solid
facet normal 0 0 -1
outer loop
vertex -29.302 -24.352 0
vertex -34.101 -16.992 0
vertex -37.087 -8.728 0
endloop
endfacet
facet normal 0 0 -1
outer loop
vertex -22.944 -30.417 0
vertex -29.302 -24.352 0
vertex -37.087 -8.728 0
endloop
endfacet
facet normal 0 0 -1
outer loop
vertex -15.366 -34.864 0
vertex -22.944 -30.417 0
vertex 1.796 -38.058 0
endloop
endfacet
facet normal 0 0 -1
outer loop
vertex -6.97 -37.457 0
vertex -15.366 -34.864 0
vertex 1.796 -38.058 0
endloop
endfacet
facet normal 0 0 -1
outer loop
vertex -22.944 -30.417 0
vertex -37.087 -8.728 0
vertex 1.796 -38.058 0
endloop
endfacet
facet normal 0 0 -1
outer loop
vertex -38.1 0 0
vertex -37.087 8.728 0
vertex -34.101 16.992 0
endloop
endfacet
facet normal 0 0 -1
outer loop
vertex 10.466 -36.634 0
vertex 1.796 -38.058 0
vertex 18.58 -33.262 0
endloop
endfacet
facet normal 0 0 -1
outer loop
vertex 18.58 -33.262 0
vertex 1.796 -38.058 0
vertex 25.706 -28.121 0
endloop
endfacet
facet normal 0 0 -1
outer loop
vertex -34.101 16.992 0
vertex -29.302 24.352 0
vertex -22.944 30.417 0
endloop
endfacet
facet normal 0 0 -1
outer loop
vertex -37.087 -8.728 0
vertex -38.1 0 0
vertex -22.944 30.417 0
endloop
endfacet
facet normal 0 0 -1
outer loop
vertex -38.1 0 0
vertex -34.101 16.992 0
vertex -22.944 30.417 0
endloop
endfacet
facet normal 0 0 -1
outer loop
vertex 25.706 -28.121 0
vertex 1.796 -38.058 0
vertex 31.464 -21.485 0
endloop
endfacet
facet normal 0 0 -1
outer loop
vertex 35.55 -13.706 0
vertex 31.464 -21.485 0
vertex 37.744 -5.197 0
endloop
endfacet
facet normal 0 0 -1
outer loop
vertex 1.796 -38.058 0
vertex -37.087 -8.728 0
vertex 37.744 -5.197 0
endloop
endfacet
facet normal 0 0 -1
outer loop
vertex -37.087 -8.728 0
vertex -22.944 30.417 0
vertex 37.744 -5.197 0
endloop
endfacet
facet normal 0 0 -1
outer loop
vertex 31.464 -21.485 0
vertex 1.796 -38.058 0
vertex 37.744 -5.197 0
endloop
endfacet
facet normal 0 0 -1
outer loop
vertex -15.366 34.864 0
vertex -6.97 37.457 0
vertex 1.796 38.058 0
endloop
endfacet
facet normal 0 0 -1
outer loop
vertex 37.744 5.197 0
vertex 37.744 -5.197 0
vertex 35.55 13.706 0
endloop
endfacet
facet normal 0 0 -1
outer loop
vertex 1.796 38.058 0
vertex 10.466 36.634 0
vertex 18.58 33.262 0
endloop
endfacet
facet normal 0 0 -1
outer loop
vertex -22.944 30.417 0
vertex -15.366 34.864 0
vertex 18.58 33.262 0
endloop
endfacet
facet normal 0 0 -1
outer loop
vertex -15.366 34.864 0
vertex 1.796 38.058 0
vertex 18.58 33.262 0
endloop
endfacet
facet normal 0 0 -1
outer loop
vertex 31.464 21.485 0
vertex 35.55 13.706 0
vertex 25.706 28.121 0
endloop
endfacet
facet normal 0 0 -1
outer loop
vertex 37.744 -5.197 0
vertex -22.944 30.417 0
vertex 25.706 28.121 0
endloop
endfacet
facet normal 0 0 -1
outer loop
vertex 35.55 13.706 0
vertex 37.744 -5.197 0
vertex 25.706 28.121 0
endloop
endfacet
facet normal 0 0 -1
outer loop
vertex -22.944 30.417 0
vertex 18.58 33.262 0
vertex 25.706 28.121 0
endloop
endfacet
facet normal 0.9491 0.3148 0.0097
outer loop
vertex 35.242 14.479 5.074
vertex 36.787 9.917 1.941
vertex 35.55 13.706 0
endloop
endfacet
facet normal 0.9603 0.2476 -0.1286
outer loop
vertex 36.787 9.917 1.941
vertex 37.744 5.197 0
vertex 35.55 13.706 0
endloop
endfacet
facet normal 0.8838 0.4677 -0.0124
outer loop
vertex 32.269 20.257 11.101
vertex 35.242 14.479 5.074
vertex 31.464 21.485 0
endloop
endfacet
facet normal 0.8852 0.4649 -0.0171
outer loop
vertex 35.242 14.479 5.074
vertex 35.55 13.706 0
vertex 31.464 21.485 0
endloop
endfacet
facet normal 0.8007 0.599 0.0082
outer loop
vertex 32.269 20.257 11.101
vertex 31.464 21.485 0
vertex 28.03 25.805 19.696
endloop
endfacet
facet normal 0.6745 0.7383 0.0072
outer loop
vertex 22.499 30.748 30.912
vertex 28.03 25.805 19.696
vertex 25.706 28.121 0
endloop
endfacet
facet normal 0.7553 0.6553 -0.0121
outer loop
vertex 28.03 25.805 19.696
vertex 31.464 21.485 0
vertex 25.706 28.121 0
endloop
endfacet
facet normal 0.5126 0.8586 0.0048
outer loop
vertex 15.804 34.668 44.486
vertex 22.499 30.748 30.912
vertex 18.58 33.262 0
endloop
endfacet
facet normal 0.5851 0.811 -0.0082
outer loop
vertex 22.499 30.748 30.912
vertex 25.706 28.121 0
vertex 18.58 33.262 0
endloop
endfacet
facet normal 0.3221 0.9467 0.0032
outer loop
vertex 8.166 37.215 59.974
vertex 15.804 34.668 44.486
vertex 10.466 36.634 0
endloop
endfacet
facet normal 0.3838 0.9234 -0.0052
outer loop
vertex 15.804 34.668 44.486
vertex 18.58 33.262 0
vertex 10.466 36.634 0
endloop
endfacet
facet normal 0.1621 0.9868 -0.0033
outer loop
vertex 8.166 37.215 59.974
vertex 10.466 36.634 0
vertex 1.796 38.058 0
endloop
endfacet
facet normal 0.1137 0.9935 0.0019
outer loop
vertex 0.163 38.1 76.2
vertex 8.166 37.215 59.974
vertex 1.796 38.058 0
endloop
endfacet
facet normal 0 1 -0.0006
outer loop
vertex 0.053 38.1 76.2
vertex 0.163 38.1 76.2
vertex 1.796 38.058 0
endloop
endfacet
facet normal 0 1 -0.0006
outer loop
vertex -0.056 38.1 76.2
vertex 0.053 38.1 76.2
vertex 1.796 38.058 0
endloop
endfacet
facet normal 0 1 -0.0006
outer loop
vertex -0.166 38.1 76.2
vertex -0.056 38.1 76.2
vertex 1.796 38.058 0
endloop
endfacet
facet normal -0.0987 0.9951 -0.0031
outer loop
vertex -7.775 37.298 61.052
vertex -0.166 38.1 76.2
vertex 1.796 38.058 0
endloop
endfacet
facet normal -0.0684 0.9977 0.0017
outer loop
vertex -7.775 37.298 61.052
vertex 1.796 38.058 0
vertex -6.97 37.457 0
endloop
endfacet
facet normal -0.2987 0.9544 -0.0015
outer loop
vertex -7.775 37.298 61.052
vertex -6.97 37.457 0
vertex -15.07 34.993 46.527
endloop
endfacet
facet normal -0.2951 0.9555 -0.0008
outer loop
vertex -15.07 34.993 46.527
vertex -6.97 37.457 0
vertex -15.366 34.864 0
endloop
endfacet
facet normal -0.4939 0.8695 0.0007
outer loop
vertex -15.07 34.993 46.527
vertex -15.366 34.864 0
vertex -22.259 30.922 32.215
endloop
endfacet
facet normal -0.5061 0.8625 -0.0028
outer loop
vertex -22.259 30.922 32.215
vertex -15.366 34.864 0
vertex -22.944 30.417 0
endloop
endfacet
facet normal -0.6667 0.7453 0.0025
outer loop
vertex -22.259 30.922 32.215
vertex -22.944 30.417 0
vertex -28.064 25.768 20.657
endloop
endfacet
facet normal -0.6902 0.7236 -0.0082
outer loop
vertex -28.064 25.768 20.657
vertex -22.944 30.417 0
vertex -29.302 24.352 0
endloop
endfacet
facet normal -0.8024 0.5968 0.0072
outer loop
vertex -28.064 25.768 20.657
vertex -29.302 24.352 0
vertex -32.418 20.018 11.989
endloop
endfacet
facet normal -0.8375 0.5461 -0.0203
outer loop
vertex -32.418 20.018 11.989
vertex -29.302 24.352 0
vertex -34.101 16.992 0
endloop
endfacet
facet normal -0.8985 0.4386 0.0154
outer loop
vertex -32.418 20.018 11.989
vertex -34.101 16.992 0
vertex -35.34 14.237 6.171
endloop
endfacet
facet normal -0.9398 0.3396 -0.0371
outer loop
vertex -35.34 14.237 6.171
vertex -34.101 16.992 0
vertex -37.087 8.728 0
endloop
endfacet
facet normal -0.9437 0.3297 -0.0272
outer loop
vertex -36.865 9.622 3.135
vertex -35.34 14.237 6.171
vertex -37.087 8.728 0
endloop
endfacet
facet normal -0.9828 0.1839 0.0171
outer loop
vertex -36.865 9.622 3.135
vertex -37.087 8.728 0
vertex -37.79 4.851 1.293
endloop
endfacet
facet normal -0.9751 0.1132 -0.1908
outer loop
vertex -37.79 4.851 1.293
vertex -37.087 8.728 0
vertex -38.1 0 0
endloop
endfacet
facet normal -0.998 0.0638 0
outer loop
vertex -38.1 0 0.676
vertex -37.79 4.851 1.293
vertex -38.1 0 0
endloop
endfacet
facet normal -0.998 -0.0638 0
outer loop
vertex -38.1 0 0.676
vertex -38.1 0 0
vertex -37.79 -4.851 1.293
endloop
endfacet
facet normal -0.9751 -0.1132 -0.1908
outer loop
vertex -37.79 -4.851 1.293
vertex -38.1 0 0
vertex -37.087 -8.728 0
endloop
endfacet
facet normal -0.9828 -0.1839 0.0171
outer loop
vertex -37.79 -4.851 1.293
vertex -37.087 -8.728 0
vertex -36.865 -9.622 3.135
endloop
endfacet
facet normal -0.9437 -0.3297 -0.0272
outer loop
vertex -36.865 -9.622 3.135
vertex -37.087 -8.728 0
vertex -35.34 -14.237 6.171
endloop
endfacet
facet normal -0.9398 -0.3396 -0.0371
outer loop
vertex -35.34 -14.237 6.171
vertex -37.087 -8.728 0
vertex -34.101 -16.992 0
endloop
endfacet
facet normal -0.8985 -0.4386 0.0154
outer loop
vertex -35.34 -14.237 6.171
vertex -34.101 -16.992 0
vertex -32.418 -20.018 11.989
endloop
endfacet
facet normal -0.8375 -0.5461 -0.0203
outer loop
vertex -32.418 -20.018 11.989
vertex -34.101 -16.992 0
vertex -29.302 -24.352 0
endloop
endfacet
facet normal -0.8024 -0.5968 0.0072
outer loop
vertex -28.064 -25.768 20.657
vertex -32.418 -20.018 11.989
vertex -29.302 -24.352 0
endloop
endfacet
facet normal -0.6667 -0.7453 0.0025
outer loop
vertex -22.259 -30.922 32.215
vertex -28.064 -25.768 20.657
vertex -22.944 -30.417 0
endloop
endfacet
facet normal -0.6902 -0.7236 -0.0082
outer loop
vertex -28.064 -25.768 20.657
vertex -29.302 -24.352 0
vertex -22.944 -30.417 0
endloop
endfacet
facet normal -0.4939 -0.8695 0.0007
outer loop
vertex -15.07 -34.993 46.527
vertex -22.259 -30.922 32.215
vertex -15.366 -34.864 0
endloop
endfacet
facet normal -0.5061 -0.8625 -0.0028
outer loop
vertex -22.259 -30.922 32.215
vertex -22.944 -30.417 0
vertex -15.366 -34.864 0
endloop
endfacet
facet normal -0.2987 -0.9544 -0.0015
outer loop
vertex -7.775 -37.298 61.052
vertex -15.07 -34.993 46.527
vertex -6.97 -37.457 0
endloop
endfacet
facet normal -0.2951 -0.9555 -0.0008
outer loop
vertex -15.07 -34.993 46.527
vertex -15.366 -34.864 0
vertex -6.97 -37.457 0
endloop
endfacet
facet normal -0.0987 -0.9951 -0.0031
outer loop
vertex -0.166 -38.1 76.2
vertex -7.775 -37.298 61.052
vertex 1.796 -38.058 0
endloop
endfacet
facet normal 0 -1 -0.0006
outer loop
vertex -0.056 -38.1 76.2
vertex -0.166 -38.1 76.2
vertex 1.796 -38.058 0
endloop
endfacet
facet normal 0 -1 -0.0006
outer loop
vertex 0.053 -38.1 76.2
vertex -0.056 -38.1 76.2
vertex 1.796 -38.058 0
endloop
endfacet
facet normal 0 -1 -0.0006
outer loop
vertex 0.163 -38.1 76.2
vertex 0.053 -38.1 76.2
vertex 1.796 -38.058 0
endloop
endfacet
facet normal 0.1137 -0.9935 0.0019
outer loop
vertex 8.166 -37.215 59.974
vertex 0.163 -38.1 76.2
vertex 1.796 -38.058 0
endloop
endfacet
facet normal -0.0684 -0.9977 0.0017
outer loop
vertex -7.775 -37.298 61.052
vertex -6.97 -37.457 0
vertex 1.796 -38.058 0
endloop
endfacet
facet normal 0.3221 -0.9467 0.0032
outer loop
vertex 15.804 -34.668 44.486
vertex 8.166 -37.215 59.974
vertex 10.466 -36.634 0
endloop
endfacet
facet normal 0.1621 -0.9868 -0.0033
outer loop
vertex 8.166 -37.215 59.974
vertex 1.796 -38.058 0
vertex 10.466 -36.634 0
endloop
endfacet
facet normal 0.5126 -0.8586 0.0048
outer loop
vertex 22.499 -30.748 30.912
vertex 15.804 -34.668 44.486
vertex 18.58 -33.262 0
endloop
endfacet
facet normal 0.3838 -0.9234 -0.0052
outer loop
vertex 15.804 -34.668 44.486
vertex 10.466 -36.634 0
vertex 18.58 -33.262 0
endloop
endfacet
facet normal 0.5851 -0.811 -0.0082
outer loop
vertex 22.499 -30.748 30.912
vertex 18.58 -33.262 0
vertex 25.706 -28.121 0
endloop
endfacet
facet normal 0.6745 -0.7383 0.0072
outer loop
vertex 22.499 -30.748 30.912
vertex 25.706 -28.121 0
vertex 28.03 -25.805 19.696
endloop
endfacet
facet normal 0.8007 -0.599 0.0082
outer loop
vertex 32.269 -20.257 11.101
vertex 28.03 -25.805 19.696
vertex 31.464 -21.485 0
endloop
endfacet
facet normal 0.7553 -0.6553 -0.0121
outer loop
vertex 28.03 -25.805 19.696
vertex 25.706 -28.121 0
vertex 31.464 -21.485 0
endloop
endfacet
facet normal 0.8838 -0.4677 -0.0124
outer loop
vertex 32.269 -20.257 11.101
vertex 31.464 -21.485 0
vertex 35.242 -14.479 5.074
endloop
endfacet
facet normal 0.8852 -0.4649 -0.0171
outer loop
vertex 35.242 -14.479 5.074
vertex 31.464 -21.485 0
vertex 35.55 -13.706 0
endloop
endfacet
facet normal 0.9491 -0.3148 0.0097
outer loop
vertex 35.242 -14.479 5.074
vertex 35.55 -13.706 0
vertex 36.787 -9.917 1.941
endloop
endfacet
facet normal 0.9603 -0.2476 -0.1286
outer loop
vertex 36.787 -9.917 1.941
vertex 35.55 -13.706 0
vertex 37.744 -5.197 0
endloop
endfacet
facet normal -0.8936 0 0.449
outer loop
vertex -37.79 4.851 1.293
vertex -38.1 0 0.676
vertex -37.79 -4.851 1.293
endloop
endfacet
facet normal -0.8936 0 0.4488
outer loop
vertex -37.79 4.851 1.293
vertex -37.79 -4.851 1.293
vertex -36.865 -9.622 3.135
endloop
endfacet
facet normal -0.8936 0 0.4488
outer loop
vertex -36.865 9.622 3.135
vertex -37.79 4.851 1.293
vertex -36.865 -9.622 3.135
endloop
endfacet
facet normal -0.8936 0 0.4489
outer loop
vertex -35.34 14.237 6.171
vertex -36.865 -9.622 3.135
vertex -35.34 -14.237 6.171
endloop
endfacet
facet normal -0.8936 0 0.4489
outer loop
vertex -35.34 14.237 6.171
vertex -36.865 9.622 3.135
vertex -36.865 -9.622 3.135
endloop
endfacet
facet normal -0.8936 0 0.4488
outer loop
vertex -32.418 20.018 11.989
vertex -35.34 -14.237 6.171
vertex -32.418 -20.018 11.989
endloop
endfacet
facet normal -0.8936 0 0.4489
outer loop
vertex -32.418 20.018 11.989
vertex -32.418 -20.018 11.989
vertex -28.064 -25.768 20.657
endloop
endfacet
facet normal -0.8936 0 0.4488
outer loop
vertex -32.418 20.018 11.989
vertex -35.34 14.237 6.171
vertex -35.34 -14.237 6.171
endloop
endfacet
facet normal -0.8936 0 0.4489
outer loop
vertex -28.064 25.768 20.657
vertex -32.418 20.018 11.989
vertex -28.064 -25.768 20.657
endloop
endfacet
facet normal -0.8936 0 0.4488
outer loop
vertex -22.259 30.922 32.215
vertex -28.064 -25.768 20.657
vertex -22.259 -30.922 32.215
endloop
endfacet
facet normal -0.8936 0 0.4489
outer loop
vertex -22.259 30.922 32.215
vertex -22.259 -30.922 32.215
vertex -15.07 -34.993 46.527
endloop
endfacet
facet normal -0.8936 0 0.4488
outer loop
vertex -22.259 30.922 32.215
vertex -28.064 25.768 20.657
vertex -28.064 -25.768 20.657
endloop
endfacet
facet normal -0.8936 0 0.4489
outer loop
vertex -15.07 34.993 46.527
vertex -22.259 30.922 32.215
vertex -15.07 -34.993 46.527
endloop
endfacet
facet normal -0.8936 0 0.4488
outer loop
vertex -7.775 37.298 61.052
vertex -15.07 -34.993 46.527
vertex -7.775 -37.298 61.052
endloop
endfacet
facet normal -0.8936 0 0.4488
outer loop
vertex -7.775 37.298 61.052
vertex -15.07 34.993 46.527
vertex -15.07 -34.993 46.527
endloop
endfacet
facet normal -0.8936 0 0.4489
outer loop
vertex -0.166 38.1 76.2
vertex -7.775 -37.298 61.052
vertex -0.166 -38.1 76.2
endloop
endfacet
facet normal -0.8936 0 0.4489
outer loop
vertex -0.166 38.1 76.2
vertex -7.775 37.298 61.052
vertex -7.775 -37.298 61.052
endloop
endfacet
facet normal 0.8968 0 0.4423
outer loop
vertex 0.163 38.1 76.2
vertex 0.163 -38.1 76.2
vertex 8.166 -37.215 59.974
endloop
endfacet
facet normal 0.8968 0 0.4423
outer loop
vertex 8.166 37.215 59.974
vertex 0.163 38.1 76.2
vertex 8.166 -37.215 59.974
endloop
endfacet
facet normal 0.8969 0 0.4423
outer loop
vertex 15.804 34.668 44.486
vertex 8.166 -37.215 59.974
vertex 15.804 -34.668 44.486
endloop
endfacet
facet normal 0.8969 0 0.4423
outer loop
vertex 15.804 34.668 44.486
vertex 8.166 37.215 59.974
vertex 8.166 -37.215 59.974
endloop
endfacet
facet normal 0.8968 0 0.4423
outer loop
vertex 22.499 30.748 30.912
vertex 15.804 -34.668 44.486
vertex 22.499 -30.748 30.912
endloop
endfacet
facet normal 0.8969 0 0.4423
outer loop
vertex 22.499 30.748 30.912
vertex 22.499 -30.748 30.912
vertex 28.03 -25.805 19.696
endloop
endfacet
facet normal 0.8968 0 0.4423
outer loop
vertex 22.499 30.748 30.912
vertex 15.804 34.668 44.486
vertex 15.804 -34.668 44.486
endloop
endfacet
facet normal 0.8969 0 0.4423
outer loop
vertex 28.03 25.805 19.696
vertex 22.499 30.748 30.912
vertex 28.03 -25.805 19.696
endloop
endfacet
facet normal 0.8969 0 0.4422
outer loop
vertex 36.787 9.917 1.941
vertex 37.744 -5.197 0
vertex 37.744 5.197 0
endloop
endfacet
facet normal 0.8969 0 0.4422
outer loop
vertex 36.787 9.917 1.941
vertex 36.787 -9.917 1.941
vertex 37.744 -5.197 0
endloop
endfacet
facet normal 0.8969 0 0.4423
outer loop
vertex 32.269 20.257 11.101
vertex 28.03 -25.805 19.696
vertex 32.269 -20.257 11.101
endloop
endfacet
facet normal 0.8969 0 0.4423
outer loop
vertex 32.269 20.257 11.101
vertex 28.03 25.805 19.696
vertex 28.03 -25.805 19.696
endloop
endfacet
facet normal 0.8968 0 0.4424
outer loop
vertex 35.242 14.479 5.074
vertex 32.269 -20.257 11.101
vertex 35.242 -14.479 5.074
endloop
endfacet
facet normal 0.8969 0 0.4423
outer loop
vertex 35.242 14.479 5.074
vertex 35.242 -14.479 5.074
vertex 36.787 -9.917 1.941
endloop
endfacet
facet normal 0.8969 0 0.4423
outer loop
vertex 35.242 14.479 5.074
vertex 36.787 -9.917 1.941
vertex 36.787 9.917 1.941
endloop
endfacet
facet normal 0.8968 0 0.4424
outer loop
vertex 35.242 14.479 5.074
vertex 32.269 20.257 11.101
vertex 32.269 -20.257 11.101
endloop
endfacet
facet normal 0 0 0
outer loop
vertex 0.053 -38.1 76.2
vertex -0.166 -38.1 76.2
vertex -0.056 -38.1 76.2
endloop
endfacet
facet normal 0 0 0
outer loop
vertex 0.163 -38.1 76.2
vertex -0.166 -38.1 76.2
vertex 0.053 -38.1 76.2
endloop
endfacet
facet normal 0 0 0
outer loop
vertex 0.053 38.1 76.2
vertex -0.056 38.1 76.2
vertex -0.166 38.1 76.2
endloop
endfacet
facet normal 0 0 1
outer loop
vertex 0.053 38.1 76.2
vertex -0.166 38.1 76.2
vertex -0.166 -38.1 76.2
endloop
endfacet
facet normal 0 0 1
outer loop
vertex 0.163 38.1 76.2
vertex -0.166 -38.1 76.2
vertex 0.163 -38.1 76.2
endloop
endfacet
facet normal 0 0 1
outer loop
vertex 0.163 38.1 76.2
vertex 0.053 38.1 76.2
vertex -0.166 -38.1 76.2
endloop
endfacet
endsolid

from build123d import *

# Parameters (mm, degrees)
F0_R     = 38.1
F1_DEPTH = 76.2
F3_DEPTH = 71.882
F4_DEPTH = 64.77


with BuildPart() as f1:
    # F0 (on Top) → F1 (new body)
    with BuildSketch(Plane.XY):
        Circle(F0_R)
    extrude(amount=F1_DEPTH)

    # F2 (on Front) → F3 (cut)
    with BuildSketch(Plane.XZ):
        Polygon((-49.077209, 0), (-38.439587, 0), (0, 76.531306), (37.743848, 0), (45.744851, 0), (45.744851, 81.064962), (-51.657092, 81.064962), align=None)
    extrude(amount=F3_DEPTH, mode=Mode.SUBTRACT)

    # F2 (on Front) → F4 (cut)
    with BuildSketch(Plane.XZ):
        Polygon((-49.077209, 0), (-38.439587, 0), (0, 76.531306), (37.743848, 0), (45.744851, 0), (45.744851, 81.064962), (-51.657092, 81.064962), align=None)
    extrude(amount=-F4_DEPTH, mode=Mode.SUBTRACT)


solid = f1.part
